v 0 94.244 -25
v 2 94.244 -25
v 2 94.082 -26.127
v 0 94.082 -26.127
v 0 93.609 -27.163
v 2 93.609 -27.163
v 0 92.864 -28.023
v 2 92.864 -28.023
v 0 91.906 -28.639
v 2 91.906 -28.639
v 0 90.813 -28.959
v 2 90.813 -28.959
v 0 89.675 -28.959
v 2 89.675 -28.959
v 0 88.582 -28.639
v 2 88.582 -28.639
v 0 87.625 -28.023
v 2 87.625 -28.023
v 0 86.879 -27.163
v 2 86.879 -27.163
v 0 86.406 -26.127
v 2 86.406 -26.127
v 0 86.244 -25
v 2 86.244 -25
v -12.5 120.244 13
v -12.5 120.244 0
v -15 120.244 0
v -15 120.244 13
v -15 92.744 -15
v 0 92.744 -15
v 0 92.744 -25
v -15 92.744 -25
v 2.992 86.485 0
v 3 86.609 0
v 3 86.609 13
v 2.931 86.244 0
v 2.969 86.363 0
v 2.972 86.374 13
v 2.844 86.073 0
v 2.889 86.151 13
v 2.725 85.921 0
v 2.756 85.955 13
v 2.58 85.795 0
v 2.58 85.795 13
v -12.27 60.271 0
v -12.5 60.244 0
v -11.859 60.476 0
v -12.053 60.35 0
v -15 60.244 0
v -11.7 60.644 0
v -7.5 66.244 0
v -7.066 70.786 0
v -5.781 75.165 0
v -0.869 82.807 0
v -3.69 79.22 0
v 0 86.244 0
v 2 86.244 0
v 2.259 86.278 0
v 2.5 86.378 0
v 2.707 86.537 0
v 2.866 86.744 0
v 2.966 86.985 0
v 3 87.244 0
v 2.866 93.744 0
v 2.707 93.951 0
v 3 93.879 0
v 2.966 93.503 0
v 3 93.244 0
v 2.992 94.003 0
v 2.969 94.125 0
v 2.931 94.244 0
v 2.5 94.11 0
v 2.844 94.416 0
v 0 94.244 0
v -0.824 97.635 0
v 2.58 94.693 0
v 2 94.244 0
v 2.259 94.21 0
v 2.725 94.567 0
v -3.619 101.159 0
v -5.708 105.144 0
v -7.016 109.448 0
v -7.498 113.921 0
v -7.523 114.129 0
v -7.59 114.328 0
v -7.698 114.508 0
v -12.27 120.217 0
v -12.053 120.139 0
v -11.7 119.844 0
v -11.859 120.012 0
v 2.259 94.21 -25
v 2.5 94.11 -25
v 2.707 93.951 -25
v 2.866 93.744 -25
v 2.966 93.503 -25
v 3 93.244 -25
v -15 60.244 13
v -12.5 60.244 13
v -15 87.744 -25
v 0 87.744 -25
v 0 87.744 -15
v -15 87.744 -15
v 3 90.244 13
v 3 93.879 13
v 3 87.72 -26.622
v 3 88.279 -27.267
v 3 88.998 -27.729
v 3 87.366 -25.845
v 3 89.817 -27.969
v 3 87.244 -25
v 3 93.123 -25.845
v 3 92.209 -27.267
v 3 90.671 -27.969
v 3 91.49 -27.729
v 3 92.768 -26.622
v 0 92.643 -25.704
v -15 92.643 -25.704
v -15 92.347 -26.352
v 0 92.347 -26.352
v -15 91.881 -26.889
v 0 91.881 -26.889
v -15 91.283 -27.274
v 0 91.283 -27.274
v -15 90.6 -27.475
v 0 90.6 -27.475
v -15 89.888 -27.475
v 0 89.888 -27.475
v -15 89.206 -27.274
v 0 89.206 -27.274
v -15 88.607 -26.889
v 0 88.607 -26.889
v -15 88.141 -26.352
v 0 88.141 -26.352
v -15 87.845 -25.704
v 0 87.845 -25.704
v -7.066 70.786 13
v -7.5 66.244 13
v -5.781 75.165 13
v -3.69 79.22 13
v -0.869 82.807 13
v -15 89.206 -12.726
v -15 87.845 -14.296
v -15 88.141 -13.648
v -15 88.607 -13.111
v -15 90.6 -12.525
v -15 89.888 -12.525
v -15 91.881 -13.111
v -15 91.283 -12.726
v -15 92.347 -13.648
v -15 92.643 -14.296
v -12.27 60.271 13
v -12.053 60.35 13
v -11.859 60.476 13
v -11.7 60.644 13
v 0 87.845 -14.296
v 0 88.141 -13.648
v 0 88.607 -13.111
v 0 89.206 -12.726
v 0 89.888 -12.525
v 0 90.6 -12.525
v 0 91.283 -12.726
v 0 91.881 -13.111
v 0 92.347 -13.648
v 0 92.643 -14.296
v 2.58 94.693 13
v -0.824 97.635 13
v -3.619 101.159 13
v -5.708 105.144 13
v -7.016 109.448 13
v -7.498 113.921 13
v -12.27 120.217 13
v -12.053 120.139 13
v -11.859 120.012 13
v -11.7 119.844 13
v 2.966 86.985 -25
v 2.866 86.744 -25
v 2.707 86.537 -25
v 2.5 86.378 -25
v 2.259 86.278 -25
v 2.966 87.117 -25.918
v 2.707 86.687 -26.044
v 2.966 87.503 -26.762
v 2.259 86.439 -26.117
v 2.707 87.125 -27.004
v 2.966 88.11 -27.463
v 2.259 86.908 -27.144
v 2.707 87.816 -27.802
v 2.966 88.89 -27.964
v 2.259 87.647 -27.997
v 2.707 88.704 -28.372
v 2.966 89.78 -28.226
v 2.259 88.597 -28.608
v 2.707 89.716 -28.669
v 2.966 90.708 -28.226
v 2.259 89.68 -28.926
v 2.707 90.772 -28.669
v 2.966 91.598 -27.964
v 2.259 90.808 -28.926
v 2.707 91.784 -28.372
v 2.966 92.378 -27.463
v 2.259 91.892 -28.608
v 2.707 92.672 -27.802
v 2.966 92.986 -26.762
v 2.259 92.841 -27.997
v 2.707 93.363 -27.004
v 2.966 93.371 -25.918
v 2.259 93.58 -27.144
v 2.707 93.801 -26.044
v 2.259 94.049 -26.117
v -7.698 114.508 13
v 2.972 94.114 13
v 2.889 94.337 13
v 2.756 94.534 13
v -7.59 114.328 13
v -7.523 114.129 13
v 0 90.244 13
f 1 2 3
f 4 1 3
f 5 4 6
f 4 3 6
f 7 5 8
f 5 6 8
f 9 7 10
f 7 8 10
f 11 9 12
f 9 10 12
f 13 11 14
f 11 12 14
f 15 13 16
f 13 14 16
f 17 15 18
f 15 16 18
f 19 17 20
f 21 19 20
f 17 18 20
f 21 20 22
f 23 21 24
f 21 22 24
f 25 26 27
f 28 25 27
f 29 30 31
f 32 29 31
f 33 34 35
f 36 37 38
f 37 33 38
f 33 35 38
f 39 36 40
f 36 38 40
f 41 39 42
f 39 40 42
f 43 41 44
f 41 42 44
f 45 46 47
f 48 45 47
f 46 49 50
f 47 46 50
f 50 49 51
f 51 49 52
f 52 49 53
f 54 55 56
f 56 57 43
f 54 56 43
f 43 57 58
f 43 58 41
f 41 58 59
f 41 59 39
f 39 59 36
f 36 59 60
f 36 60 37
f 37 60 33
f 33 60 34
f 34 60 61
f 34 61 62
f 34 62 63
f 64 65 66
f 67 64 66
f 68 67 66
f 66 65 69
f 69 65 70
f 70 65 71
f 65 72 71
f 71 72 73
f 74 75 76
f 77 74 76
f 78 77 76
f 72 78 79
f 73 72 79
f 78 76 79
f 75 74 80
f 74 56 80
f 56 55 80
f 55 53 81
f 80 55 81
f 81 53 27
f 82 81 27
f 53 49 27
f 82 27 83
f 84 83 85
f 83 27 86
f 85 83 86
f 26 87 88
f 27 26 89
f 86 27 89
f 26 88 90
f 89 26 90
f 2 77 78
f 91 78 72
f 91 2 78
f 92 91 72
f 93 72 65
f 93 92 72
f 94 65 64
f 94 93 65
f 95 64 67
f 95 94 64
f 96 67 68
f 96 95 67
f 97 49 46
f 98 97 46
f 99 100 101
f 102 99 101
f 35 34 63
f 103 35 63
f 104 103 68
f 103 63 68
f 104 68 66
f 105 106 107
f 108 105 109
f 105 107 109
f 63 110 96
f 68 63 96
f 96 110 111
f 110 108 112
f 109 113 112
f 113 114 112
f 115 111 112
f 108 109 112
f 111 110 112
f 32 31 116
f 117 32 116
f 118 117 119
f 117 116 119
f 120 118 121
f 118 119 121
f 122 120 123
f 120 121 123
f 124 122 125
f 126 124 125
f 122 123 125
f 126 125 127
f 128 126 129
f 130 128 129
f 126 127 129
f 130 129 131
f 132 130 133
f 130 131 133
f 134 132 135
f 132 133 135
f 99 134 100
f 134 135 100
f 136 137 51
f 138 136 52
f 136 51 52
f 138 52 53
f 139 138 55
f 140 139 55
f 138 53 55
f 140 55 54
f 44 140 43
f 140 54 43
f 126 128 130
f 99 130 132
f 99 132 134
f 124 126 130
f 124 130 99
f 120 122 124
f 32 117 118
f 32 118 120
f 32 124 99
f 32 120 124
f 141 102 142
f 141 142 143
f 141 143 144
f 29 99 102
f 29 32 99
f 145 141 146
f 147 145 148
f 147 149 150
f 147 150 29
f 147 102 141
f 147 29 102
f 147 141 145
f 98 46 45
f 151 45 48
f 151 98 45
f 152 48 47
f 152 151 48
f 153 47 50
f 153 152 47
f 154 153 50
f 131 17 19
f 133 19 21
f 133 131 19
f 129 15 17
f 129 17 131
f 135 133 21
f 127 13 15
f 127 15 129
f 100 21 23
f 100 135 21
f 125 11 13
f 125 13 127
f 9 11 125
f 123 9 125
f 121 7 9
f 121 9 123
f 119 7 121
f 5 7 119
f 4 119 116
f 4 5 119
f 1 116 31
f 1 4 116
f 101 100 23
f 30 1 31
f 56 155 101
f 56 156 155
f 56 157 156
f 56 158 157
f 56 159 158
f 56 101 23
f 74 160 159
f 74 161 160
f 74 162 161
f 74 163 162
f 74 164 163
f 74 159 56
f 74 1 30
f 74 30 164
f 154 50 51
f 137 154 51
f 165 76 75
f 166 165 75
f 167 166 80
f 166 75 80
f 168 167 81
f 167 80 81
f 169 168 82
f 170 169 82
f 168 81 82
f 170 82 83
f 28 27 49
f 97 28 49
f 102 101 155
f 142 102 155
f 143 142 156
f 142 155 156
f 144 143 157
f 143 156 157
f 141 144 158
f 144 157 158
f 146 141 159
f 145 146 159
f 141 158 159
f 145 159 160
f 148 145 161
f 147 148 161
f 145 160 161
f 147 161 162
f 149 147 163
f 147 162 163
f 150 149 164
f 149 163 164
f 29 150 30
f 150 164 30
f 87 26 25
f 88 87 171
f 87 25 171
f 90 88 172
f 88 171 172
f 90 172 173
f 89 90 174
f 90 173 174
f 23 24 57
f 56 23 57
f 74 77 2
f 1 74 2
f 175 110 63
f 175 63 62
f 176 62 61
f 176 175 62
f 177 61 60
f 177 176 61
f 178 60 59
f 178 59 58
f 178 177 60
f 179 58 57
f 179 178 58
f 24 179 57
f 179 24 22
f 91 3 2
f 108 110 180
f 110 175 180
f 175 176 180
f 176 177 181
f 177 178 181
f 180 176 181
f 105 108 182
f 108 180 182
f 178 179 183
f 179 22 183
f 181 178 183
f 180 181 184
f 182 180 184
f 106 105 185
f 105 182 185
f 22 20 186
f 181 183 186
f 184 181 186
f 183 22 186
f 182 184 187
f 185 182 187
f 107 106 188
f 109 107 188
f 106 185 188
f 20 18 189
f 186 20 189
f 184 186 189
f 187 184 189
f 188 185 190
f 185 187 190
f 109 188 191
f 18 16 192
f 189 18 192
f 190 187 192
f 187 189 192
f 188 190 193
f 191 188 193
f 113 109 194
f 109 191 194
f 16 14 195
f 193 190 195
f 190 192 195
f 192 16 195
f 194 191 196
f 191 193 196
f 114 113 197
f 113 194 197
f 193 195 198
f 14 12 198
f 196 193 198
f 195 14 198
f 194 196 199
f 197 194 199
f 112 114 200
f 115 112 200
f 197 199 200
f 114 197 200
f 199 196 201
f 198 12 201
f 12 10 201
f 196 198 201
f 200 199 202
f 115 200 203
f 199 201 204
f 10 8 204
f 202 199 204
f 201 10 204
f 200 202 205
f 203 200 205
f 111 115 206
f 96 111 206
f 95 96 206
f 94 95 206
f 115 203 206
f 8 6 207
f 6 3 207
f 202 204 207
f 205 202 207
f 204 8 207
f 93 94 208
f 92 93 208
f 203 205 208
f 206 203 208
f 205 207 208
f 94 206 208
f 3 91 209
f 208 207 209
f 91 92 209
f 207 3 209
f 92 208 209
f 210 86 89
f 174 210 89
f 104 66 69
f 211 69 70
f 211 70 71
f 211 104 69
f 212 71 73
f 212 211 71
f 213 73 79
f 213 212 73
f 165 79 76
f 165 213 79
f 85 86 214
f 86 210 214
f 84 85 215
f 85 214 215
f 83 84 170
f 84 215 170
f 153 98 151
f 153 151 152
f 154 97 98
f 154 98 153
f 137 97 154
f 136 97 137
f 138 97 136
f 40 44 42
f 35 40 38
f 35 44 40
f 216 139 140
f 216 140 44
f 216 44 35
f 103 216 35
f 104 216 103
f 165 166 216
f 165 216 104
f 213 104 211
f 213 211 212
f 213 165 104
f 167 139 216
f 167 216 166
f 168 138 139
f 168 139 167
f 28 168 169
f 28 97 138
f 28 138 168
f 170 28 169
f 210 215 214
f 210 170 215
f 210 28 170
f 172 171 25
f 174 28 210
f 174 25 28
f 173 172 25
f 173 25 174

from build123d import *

# Parameters (mm, degrees)
EXTRUDE_1_DEPTH  = 13
EXTRUDE_2_DEPTH  = 3
EXTRUDE_3_DEPTH  = 15
FILLET_1_R       = 1
FILLET_2_R       = 1
FILLET_START     = -29.0000001
FILLET_3_DEPTH   = 29.0000001
FILLET_3_2_ANGLE = 180
FILLET_4_R       = 1
FILLET_5_R       = 1
FILLET_8_R       = 1


with BuildPart() as part:
    # 草图1 → 凸台-拉伸1 (new body)
    with BuildSketch(Plane.XY):
        with BuildLine():
            Line((-7.5, 114.244075086), (-12, 120.244075086))
            Line((-12, 120.244075086), (-15, 120.244075086))
            Line((-15, 120.244075086), (-15, 60.244075086))
            Line((-15, 60.244075086), (-12, 60.244075086))
            Line((-12, 60.244075086), (-7.5, 66.244075086))
            ThreePointArc((-7.5, 66.244075086), (-4.713203436, 77.469047246), (3, 86.087209919))
            Line((3, 86.087209919), (3, 94.400940253))
            ThreePointArc((3, 94.400940253), (-4.713203436, 103.019102925), (-7.5, 114.244075086))
        make_face()
    extrude(amount=EXTRUDE_1_DEPTH)

    # 草图3 → 凸台-拉伸2 (add)
    with BuildSketch(Plane(origin=(3, 0, 0), x_dir=(0, 0, -1), z_dir=(1, 0, 0))):
        with BuildLine():
            Line((1, 86.244075086), (-9, 86.244075086))
            ThreePointArc((-9, 86.244075086), (-13, 90.244075086), (-9, 94.244075086))
            Line((-9, 94.244075086), (1, 94.244075086))
            Line((1, 94.244075086), (15, 94.244075086))
            Line((15, 94.244075086), (25, 94.244075086))
            ThreePointArc((25, 94.244075086), (29, 90.244075086), (25, 86.244075086))
            Line((25, 86.244075086), (15, 86.244075086))
            Line((15, 86.244075086), (1, 86.244075086))
        make_face()
    extrude(amount=-EXTRUDE_2_DEPTH)

    # 草图4 → 凸台-拉伸3 (add)
    with BuildSketch(Plane.ZY):
        with BuildLine():
            Line((-15, 92.744075086), (-25, 92.744075086))
            ThreePointArc((-25, 92.744075086), (-27.5, 90.244075086), (-25, 87.744075086))
            Line((-25, 87.744075086), (-15, 87.744075086))
            ThreePointArc((-15, 87.744075086), (-12.5, 90.244075086), (-15, 92.744075086))
        make_face()
    extrude(amount=EXTRUDE_3_DEPTH)

    # 圆角1
    fillet_1_edges = [part.edges().sort_by_distance(p)[0] for p in [
        (3, 94.400940253, 6.5),
    ]]
    fillet(fillet_1_edges, radius=FILLET_1_R)

    # 圆角2
    fillet_2_edges = [part.edges().sort_by_distance(p)[0] for p in [
        (3, 86.087209919, 6.5),
    ]]
    fillet(fillet_2_edges, radius=FILLET_2_R)

    # 圆角3: read off the stored shape, not the designer's step
    # 圆角3 outline → 圆角3 (cut)
    with BuildSketch(Plane.XY.offset(FILLET_START)):
        with BuildLine():
            ThreePointArc((2, 94.244075086), (2.707106781, 93.951181867), (3, 93.244075086))
            Line((3, 93.244075086), (3, 93.878663231))
            ThreePointArc((3, 93.878663231), (2.9825594, 94.064612221), (2.930845947, 94.244075086))
            Line((2.930845947, 94.244075086), (2, 94.244075086))
        make_face()
        with BuildLine():
            Line((3, 86.60948694), (3, 87.244075086))
            ThreePointArc((3, 87.244075086), (2.707106781, 86.536968305), (2, 86.244075086))
            Line((2, 86.244075086), (2.930845947, 86.244075086))
            ThreePointArc((2.930845947, 86.244075086), (2.982559399, 86.423537951), (3, 86.60948694))
        make_face()
    extrude(amount=FILLET_3_DEPTH, mode=Mode.SUBTRACT)

    # Fillet 3 2 outline → Fillet 3 2 (revolve, cut)
    with BuildSketch(Plane(origin=(0, 90.244075086, -25), x_dir=(0, -1, 0), z_dir=(0, 0, 1))):
        with BuildLine():
            Line((4, 3), (3, 3))
            ThreePointArc((3, 3), (3.707106781, 2.707106781), (4, 2))
            Line((4, 2), (4, 3))
        make_face()
    revolve(axis=Axis((0, 90.244075086, -25), (1, 0, 0)), revolution_arc=FILLET_3_2_ANGLE, mode=Mode.SUBTRACT)

    # 圆角4
    fillet_4_edges = [part.edges().sort_by_distance(p)[0] for p in [
        (-12, 60.244075086, 6.5),
    ]]
    fillet(fillet_4_edges, radius=FILLET_4_R)

    # 圆角5
    fillet_5_edges = [part.edges().sort_by_distance(p)[0] for p in [
        (-12, 120.244075086, 6.5),
    ]]
    fillet(fillet_5_edges, radius=FILLET_5_R)

    # 圆角8
    fillet_8_edges = [part.edges().sort_by_distance(p)[0] for p in [
        (-7.5, 114.244075086, 6.5),
    ]]
    fillet(fillet_8_edges, radius=FILLET_8_R)


solid = part.part
